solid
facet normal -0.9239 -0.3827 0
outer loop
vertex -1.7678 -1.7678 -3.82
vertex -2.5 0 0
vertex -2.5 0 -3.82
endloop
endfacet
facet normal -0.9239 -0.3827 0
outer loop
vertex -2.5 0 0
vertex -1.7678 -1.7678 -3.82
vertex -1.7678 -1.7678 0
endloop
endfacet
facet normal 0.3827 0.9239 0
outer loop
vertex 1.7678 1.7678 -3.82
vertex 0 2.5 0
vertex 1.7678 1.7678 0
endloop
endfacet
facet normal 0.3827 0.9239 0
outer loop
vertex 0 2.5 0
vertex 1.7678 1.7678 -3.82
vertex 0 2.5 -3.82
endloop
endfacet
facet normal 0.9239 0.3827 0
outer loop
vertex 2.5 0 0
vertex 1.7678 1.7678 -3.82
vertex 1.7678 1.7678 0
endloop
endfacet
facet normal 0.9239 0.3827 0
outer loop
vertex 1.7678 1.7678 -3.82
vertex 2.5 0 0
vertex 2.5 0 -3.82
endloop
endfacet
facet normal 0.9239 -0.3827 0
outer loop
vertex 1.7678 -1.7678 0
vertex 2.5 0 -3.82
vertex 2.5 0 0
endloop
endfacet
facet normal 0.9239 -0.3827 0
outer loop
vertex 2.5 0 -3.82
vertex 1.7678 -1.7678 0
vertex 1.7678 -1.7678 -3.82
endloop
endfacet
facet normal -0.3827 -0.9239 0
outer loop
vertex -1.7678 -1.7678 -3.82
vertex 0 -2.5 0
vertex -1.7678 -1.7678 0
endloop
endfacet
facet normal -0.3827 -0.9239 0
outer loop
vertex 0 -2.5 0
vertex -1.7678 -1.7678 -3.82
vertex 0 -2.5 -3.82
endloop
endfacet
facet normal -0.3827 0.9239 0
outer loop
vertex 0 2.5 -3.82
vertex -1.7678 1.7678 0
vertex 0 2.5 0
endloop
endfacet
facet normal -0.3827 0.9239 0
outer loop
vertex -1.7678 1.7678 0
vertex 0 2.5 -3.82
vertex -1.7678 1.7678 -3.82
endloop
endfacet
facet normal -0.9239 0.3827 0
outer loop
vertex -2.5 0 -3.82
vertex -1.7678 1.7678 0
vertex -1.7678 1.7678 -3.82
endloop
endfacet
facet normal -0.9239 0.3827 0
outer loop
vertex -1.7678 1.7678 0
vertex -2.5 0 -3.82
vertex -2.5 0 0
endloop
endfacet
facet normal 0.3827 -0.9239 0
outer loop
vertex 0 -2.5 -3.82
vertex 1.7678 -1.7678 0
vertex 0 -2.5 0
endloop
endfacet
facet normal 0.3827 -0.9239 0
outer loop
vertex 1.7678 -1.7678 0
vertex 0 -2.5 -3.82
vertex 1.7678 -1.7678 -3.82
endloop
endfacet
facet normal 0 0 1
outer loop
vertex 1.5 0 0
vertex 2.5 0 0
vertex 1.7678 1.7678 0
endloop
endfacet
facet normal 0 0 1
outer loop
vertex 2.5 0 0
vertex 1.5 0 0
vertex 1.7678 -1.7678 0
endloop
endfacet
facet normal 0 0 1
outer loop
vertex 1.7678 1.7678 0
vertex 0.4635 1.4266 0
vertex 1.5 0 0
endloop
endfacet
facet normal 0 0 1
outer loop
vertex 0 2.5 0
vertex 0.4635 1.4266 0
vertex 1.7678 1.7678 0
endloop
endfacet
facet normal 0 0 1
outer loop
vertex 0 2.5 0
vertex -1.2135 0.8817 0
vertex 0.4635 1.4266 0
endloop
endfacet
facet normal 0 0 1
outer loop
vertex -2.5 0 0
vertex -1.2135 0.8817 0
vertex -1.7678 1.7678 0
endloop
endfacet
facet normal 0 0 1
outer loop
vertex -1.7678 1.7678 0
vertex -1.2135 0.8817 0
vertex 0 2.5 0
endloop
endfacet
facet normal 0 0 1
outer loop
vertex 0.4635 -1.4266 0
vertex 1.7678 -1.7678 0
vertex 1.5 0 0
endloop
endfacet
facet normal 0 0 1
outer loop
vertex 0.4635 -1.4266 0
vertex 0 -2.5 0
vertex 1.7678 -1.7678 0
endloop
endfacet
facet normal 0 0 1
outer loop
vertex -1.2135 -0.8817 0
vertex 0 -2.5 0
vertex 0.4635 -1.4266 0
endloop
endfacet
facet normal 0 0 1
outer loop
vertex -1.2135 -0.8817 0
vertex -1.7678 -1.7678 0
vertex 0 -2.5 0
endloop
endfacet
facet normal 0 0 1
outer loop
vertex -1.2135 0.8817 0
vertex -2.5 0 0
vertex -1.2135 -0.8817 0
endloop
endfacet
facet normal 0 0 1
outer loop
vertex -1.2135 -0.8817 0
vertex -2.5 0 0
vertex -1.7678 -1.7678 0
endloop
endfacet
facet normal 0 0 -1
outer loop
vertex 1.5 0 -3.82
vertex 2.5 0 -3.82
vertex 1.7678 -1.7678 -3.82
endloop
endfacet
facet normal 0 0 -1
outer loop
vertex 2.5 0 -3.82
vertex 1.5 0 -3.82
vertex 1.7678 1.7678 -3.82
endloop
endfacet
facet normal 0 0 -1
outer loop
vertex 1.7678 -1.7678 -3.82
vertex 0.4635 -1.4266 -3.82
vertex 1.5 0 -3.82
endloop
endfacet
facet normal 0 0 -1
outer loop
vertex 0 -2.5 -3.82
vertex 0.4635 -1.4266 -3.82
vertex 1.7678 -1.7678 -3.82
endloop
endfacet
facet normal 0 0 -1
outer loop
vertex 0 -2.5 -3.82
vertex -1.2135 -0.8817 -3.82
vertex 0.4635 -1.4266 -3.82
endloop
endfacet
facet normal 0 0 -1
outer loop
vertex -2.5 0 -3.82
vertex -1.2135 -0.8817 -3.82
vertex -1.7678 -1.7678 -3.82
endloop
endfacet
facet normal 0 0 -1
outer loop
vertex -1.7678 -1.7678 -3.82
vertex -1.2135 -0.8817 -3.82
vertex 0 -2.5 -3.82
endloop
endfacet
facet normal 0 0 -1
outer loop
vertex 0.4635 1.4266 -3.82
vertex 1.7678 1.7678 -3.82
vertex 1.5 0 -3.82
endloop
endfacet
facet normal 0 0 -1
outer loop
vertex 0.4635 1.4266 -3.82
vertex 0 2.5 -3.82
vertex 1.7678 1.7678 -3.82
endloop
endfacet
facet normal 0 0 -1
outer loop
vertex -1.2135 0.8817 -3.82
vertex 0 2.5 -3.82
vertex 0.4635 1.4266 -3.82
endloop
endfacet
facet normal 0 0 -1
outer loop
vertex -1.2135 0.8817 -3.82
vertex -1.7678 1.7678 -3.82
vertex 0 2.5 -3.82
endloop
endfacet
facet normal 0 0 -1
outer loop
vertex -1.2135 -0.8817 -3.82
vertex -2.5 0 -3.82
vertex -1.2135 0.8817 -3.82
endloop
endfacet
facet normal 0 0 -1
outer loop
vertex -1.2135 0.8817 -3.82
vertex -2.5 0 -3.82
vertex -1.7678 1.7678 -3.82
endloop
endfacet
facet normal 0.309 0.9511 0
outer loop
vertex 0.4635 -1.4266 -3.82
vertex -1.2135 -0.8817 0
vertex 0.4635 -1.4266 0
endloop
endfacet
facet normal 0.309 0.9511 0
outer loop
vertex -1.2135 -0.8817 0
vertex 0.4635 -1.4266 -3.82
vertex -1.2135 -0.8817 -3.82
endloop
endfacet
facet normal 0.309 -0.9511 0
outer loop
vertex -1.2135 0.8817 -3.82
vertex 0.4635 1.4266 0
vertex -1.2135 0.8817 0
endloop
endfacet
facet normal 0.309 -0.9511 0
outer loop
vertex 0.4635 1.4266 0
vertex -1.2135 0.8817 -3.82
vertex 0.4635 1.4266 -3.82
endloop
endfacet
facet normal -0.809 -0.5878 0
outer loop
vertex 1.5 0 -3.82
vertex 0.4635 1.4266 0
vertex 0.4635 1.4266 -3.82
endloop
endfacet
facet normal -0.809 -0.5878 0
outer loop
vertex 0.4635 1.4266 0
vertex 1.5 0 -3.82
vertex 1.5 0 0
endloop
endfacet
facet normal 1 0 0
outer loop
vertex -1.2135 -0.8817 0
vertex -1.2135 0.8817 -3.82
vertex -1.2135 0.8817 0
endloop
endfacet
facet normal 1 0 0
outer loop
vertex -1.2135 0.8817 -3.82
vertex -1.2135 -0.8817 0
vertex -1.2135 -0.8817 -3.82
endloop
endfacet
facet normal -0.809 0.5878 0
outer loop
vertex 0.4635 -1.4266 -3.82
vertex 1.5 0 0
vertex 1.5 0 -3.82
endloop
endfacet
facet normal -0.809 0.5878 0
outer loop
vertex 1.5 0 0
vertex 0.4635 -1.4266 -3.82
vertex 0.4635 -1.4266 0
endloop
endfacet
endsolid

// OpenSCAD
module m3_insert() {
    translate([0, 0, -3.82/2])
        difference() {
            cylinder(h=3.82, r=2.5, center=true);
            cylinder(h = 4, r = 1.5, center=true);
        }
}

m3_insert();
